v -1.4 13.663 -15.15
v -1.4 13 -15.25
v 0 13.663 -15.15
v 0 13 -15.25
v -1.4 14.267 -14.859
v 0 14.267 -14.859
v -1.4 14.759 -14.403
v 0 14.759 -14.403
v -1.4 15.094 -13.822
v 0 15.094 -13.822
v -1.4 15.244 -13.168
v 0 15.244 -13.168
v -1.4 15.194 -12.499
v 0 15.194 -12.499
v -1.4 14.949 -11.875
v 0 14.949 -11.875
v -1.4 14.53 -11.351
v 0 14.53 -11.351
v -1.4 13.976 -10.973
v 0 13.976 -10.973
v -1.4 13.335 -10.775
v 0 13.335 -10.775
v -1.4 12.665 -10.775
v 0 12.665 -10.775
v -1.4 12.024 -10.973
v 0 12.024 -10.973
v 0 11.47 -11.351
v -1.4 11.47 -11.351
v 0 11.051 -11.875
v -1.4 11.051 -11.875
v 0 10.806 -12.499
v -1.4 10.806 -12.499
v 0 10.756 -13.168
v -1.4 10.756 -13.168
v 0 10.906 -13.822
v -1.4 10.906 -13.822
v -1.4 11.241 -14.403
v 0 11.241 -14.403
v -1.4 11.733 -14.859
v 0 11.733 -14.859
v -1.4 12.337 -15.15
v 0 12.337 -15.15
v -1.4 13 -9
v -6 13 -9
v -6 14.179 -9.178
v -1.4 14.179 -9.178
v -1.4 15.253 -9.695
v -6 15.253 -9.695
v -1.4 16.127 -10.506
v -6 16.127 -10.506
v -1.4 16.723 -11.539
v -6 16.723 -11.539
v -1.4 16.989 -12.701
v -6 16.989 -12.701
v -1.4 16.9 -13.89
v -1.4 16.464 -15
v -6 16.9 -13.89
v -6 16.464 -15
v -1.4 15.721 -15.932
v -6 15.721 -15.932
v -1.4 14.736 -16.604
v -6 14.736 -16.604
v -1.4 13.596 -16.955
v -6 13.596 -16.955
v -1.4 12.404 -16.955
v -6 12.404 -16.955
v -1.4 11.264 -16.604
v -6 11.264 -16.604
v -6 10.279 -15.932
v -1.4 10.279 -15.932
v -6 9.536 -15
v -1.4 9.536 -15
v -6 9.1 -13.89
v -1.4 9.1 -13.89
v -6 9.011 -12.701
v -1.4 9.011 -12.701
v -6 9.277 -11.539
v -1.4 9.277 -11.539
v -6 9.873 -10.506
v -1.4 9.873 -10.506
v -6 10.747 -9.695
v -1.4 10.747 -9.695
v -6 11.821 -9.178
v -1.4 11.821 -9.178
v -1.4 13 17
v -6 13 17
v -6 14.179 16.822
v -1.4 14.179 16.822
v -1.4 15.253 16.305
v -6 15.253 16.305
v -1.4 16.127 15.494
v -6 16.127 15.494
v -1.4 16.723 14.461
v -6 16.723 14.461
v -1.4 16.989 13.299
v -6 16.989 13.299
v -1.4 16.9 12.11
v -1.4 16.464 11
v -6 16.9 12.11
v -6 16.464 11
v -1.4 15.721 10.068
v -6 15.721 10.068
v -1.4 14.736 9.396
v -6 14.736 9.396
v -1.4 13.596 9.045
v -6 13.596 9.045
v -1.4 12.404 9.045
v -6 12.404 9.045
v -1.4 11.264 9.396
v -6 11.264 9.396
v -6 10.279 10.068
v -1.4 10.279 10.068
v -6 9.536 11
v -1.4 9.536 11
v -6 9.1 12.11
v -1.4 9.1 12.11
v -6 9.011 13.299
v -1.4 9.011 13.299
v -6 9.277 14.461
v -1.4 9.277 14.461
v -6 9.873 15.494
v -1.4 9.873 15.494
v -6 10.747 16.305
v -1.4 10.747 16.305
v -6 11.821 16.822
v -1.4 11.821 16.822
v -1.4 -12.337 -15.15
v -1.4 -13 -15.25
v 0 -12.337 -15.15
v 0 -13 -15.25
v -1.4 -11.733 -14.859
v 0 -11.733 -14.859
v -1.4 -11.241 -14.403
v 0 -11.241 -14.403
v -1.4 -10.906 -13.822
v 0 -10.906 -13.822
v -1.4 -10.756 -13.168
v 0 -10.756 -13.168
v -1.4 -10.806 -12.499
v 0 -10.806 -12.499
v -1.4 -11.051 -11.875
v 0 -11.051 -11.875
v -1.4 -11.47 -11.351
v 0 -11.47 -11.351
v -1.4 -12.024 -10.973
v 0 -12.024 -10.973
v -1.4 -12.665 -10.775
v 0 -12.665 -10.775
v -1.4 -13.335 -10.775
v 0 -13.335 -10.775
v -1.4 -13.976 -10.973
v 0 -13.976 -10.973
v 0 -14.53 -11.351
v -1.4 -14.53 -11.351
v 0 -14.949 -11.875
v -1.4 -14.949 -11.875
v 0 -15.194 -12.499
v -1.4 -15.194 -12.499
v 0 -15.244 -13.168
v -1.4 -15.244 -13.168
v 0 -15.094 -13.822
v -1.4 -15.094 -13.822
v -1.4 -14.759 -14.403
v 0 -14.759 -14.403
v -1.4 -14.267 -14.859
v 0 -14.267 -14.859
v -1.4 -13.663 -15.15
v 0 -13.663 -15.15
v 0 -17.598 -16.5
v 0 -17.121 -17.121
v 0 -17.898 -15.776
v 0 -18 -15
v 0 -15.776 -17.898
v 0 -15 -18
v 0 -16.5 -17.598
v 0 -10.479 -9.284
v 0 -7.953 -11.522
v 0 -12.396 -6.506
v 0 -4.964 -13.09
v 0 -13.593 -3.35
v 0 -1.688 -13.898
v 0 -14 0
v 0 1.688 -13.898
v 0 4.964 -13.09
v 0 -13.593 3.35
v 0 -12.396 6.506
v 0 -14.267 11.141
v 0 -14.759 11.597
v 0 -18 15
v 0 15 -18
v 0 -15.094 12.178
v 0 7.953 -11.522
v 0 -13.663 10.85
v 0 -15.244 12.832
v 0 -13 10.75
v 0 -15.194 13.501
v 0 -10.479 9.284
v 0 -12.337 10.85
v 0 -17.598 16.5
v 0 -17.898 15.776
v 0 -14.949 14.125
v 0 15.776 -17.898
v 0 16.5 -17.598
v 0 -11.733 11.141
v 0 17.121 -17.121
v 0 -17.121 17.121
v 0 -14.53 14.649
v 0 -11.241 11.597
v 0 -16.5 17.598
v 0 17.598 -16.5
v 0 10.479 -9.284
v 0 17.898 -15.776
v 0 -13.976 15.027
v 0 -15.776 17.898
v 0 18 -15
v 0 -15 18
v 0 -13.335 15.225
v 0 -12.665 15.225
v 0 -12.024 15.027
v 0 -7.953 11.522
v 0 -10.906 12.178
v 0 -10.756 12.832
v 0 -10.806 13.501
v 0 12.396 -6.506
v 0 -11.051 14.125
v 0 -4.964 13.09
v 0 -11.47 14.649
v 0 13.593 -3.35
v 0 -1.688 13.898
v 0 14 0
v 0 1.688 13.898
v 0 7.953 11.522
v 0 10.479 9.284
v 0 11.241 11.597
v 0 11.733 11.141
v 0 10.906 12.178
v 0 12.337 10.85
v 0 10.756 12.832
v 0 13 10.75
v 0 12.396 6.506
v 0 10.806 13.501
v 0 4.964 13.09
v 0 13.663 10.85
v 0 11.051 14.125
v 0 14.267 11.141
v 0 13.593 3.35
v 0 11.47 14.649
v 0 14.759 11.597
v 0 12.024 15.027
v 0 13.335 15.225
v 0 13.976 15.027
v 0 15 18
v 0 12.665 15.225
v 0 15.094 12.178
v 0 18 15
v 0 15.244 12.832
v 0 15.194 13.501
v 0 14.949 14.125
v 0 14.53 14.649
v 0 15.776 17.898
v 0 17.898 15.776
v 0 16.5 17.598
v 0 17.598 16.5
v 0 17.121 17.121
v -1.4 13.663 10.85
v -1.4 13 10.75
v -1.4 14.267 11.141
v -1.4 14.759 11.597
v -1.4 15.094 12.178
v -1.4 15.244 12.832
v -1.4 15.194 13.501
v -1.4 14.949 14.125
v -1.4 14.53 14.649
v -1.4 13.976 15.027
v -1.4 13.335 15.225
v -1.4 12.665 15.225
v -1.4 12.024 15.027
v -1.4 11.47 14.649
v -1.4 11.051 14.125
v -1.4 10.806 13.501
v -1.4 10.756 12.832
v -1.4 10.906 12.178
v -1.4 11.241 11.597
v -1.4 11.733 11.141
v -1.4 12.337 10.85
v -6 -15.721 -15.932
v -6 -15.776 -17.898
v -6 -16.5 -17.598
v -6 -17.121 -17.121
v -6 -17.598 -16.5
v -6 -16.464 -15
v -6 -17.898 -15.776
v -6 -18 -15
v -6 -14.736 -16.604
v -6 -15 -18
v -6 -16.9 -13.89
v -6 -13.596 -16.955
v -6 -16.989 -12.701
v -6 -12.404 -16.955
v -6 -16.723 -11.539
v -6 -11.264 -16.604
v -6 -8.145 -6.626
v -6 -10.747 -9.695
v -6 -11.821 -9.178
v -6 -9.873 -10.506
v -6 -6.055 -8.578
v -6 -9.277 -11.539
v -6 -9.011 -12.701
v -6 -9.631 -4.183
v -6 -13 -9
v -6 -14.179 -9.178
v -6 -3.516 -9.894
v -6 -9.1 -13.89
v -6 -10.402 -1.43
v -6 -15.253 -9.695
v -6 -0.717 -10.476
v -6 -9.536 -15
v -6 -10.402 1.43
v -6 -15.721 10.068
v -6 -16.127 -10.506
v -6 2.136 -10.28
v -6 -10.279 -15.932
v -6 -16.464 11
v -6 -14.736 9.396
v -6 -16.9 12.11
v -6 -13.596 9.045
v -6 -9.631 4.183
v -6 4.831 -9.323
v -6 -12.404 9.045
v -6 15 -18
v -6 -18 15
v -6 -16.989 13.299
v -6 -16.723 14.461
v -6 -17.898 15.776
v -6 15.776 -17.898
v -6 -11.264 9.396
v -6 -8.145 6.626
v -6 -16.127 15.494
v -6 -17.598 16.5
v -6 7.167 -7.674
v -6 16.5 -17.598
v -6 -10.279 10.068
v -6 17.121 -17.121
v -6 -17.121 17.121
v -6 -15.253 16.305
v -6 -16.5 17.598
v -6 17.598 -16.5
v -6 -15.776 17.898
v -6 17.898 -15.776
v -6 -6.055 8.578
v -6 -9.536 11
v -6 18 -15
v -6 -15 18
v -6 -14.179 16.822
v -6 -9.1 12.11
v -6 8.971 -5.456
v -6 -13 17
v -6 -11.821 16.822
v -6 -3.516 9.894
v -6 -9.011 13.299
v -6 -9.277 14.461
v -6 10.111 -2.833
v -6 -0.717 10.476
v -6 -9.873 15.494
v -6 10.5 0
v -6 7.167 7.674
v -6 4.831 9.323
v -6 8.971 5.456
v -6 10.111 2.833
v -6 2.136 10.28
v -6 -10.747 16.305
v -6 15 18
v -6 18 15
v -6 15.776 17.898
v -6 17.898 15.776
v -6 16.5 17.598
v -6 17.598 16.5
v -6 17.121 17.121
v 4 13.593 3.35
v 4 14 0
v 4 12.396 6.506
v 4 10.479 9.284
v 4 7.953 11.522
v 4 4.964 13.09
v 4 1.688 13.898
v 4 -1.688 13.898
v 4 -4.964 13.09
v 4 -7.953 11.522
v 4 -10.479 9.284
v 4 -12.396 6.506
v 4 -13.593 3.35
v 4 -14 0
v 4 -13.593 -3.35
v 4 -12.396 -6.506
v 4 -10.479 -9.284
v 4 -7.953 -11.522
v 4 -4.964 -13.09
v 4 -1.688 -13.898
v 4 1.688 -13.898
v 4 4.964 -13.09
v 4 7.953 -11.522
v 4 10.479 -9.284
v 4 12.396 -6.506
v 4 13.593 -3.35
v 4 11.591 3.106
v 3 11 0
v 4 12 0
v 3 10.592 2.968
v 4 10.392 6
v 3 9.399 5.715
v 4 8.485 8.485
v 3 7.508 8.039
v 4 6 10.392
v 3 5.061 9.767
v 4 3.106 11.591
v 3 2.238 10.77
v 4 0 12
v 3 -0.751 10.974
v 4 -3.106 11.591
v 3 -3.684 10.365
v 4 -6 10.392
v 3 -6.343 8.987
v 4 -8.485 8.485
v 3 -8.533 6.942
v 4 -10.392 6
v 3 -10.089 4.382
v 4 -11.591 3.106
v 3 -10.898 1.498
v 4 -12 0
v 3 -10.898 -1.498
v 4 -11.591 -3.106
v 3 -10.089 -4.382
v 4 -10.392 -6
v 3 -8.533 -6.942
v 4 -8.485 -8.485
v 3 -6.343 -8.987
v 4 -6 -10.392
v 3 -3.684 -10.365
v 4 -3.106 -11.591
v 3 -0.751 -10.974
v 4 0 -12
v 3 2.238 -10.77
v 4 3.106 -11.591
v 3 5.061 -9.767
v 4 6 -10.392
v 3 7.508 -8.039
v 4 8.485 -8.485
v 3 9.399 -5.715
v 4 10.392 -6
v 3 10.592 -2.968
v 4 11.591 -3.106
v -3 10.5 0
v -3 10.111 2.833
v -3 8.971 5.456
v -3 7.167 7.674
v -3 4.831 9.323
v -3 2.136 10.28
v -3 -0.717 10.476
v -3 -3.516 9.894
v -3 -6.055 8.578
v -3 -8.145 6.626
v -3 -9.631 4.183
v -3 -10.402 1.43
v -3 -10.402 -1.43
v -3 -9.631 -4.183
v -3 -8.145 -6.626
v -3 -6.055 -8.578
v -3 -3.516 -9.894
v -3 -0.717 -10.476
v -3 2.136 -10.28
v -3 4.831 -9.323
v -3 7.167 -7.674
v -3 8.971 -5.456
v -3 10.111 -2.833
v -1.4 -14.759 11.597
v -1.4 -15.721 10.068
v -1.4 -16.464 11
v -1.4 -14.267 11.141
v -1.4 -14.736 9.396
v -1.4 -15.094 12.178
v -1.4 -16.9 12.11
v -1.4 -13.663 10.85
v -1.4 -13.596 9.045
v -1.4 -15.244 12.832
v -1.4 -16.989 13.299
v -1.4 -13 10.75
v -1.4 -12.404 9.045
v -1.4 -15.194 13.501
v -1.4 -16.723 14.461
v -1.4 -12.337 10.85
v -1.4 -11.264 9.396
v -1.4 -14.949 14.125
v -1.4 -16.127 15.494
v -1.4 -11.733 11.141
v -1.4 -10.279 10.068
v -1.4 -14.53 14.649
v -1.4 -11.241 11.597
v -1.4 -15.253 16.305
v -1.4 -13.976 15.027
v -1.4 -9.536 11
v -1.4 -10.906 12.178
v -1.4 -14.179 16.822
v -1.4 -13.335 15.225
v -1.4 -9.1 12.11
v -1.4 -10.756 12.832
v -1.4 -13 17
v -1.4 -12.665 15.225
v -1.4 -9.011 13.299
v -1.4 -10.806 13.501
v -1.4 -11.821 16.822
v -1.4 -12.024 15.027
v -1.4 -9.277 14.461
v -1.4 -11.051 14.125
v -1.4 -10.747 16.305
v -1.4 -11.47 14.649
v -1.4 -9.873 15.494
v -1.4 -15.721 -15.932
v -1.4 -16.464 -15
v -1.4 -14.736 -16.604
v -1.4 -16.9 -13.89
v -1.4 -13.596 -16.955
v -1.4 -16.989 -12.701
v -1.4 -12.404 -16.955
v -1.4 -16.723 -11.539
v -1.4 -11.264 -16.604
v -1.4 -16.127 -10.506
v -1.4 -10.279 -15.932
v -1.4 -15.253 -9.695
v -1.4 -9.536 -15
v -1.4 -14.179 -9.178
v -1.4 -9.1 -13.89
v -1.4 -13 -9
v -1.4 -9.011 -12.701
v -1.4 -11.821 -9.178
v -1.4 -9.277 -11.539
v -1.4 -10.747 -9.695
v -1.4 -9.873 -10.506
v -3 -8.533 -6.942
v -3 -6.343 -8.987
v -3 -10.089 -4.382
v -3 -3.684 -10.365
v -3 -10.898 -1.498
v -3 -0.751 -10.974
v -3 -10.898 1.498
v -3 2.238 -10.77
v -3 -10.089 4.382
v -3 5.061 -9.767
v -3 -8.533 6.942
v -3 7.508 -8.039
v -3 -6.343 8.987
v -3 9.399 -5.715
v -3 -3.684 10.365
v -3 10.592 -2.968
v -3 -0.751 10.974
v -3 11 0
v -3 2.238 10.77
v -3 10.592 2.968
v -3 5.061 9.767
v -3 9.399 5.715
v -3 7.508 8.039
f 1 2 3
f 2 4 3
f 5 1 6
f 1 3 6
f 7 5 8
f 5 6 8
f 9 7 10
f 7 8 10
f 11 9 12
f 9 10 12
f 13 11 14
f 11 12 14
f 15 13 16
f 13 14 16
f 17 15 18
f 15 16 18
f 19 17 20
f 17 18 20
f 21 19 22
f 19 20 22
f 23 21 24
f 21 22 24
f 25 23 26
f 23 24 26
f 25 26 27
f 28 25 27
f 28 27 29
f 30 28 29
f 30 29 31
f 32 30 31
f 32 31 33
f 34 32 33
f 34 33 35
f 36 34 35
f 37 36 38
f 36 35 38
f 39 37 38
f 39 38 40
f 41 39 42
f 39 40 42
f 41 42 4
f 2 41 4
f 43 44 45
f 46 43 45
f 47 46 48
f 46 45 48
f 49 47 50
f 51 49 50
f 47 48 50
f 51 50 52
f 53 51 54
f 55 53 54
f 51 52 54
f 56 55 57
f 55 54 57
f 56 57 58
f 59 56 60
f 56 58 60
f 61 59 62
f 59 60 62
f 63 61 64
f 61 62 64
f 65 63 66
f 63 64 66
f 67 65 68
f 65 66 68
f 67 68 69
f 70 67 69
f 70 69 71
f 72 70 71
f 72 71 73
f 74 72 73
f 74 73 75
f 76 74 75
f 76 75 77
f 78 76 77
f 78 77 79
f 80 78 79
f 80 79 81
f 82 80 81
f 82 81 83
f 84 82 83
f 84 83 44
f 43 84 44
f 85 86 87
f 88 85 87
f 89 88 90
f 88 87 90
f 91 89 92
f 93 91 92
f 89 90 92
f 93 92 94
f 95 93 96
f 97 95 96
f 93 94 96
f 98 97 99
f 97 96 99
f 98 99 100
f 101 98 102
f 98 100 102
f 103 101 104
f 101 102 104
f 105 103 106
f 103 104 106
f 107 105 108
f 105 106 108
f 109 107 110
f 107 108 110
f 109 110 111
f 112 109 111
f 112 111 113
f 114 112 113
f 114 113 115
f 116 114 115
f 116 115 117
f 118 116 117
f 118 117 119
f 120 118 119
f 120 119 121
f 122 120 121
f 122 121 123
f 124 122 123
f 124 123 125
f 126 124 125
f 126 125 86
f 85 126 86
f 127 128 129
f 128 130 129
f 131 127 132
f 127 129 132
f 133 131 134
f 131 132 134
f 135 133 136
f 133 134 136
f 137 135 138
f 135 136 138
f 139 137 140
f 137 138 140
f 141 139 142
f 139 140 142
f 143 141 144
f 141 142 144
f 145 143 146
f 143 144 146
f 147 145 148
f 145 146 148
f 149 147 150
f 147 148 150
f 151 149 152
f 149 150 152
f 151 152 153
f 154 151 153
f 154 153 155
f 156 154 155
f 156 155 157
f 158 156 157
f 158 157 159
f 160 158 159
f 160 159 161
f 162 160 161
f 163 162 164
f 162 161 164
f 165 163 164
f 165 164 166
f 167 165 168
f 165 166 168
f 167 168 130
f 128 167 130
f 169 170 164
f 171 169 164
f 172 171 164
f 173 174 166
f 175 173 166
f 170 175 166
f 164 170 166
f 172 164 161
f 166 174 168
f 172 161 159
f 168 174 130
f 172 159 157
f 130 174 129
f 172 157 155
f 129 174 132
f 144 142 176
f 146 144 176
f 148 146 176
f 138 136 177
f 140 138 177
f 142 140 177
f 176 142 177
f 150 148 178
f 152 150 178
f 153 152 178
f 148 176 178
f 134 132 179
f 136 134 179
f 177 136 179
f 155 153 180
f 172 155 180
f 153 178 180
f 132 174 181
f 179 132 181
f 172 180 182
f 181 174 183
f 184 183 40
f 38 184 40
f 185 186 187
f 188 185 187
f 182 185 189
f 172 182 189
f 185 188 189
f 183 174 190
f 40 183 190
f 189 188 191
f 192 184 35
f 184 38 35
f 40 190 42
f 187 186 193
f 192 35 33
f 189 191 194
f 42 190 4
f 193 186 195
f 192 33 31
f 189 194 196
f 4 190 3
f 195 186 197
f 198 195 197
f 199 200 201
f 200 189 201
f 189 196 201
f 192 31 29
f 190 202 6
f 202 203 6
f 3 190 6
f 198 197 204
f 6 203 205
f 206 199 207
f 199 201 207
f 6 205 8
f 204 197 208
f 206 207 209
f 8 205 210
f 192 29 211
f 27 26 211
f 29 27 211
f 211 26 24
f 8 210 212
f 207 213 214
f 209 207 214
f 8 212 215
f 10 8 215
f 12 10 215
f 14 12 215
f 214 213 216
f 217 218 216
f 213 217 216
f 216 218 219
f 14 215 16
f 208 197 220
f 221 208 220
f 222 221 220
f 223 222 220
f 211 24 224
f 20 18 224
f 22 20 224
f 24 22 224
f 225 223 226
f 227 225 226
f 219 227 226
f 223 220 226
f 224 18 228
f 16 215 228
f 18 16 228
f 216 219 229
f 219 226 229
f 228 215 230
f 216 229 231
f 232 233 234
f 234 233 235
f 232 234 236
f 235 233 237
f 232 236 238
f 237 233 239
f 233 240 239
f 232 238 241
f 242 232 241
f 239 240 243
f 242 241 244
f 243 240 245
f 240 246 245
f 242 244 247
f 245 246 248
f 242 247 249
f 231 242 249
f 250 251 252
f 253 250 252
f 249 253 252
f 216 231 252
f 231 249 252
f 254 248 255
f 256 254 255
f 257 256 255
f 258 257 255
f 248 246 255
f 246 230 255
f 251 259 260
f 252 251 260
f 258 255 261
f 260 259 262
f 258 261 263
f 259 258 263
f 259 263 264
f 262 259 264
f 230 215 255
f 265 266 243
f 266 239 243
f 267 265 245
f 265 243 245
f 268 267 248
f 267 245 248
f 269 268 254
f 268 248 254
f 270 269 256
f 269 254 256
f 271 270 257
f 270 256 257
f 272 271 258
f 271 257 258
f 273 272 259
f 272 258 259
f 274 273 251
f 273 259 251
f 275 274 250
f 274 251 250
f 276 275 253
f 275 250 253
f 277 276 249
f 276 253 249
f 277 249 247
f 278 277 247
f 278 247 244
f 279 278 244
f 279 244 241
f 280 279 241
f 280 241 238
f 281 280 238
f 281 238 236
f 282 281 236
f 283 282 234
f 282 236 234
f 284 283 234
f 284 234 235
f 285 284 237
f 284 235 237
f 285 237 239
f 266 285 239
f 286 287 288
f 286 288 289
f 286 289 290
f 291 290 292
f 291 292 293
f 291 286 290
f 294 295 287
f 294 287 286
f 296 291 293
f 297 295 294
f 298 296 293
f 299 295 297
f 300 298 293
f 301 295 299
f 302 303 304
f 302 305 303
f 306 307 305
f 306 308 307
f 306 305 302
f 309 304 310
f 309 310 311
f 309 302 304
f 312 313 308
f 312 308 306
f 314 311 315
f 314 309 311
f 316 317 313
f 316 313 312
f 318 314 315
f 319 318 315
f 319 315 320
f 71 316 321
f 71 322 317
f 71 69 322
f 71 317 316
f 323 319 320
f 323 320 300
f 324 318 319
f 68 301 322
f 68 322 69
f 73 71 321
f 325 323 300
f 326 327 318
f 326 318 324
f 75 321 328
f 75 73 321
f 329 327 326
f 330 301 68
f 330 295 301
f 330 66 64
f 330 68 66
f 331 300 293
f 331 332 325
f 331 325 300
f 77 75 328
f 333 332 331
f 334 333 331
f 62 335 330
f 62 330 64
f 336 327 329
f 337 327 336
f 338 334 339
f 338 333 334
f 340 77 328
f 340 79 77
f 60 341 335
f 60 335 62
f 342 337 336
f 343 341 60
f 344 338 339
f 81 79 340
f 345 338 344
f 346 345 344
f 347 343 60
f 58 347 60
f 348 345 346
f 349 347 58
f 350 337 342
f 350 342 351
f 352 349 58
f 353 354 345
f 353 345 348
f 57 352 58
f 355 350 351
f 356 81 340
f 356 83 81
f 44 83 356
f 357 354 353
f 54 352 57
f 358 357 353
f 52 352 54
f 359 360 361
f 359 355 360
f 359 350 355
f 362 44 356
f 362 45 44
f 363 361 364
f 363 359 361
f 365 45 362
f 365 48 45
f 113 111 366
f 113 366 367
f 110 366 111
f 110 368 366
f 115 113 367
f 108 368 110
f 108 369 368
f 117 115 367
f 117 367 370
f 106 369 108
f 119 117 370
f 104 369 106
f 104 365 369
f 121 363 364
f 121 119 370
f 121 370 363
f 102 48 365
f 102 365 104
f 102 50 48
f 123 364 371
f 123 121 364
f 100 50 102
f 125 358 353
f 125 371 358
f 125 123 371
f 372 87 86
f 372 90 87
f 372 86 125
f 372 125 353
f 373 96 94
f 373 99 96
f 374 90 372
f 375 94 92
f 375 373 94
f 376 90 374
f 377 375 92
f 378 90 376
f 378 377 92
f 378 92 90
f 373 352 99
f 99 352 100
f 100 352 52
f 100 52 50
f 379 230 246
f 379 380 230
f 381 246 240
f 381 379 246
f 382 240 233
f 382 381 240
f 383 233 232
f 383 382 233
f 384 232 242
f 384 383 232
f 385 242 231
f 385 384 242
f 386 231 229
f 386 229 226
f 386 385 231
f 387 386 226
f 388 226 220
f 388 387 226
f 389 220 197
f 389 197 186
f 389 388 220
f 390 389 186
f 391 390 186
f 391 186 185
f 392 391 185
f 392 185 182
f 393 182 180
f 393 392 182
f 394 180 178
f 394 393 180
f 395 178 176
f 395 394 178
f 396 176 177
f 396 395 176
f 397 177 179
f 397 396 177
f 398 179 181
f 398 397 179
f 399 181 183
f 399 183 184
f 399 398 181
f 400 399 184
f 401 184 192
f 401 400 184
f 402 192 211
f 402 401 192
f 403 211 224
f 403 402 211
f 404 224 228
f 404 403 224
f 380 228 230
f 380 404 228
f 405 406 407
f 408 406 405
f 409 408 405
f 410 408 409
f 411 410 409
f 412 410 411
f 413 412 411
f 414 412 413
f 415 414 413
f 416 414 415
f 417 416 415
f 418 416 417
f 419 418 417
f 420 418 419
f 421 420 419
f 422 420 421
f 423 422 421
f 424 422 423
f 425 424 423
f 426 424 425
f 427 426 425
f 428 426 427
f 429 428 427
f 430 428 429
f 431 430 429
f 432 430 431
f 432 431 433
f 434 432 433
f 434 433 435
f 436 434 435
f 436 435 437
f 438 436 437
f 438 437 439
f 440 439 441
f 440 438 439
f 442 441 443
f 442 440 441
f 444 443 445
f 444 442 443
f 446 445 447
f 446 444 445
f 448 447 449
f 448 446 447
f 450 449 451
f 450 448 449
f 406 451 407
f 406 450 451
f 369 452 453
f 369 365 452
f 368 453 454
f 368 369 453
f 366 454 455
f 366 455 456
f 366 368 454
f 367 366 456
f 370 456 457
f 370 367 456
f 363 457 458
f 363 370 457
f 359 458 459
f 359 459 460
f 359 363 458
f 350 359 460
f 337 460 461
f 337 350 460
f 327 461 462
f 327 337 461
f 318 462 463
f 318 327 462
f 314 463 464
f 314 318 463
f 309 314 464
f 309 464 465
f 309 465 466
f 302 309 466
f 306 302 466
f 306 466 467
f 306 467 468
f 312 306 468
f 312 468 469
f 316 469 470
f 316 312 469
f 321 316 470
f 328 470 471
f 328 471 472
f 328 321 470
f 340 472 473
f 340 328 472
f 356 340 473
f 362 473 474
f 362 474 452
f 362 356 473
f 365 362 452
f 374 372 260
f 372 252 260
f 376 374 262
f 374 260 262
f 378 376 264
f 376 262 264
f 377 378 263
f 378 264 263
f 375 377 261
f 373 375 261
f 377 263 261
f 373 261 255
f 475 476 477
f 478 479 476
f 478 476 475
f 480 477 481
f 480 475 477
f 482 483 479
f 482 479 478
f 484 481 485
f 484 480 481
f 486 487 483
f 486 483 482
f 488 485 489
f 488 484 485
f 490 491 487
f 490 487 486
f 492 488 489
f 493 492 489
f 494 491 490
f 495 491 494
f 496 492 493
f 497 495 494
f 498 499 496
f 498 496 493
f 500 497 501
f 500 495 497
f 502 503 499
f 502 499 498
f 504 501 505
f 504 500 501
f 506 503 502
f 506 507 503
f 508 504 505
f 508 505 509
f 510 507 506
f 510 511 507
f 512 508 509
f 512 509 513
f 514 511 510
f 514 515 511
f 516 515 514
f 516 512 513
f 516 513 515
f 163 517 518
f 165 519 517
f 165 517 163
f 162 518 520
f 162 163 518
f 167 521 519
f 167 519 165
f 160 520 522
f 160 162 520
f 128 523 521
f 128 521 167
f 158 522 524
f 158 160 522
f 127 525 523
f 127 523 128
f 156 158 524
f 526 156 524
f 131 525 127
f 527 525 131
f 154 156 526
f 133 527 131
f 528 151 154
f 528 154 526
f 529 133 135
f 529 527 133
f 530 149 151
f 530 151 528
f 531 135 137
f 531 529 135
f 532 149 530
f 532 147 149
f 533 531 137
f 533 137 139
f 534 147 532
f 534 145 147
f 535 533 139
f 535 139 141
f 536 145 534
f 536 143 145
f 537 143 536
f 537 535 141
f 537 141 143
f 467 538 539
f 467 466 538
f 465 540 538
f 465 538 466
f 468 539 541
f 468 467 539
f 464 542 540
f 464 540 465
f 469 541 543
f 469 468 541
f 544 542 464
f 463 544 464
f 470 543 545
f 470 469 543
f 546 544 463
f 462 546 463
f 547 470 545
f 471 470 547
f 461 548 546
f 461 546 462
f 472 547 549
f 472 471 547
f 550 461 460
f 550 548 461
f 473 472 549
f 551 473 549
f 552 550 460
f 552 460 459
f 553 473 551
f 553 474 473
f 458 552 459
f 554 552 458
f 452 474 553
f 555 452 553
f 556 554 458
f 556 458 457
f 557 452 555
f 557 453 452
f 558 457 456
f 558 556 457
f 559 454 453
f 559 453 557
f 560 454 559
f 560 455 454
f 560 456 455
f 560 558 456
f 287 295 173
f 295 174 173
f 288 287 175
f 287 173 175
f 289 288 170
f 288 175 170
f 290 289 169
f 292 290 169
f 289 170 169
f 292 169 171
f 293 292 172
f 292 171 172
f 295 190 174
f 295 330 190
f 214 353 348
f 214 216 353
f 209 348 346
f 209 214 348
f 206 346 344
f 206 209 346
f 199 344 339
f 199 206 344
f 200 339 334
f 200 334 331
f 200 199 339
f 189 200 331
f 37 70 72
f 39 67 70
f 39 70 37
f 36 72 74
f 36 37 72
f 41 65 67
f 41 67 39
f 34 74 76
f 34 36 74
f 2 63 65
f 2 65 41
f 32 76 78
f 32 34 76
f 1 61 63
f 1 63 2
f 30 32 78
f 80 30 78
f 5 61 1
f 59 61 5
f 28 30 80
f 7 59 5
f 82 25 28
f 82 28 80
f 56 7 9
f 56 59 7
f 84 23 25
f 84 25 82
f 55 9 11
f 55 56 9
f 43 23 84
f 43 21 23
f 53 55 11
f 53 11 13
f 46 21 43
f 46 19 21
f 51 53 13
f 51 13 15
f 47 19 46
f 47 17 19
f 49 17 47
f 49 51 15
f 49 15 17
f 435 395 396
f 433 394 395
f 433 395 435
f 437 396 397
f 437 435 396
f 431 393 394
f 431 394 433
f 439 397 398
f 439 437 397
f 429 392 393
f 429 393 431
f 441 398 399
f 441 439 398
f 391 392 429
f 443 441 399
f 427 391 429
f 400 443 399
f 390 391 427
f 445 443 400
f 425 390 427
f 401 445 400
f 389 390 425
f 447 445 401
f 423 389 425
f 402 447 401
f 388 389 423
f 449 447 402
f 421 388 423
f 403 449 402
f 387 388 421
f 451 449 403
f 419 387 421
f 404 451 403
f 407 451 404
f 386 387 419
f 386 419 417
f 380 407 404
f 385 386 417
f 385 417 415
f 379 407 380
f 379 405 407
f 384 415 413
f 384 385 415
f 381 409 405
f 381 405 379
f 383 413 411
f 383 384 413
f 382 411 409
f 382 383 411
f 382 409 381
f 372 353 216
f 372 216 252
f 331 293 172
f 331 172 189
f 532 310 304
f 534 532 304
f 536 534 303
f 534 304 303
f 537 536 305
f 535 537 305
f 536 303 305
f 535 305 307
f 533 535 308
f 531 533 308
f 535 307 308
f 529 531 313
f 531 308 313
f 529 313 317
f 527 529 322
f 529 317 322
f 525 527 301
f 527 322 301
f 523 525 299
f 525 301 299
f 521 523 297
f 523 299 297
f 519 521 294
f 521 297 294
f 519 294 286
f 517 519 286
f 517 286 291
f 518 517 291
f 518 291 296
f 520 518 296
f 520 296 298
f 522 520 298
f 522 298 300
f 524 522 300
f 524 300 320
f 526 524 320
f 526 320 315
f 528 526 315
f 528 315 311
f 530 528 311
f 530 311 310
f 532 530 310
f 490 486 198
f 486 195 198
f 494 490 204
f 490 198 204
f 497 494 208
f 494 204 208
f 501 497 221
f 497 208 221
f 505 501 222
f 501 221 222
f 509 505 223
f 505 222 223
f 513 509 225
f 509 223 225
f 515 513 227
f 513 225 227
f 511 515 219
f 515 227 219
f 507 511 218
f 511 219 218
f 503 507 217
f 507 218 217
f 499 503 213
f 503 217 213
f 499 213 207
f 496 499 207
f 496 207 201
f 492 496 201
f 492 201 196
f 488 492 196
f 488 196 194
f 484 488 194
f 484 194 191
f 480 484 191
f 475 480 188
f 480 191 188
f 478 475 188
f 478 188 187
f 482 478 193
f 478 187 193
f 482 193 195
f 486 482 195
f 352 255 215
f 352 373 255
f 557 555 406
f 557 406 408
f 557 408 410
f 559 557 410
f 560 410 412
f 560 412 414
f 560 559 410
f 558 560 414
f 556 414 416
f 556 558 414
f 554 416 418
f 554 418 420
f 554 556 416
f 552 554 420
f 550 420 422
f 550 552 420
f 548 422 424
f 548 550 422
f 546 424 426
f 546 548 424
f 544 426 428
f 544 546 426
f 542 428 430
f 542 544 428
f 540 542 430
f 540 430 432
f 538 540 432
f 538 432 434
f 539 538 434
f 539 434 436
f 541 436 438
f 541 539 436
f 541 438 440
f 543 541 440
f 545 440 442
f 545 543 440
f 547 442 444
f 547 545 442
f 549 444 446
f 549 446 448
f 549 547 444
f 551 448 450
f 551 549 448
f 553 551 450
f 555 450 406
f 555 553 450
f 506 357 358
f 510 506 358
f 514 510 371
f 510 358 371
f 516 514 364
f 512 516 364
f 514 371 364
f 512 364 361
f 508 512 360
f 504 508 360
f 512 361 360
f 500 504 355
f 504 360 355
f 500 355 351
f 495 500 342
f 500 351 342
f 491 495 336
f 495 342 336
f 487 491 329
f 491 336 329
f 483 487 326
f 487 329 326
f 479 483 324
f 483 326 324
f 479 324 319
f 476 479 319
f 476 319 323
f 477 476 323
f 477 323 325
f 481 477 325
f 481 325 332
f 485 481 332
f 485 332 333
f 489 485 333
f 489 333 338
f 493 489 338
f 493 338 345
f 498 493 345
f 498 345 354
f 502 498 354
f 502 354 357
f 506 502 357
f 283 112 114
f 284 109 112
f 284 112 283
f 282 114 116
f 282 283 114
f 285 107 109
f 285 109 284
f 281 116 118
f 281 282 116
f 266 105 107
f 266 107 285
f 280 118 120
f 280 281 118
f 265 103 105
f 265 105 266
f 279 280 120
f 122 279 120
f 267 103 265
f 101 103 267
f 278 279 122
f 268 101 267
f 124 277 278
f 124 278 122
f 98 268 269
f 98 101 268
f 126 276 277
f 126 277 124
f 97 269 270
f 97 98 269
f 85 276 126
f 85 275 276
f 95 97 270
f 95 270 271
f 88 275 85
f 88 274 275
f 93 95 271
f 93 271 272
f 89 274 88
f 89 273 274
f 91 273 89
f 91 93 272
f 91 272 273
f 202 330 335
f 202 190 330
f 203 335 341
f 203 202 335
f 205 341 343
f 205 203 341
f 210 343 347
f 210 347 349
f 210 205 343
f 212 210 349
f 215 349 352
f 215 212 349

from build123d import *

# Parameters (mm, degrees)
EXTRUDE_1_DEPTH           = 6
FILLET_1_R                = 3
HOLE_WIZARD_2_D           = 4.5
HOLE_WIZARD_2_CBORE_D     = 8
HOLE_WIZARD_2_CBORE_DEPTH = 4.6
CHAMFER_1_SIZE            = 1


with BuildPart() as part:
    # 草图1 → 旋转1 (revolve)
    with BuildSketch(Plane.XY):
        Polygon((-6, 10.5), (-6, 18), (0, 18), (0, 14), (4, 14), (4, 11), (-3, 11), (-3, 10.5), align=None)
    revolve(axis=Axis((-10.541189269, 0, 0), (1, 0, 0)))

    # 草图5 → 凸台-拉伸1 (add)
    with BuildSketch(Plane.ZY.offset(6)):
        with BuildLine():
            ThreePointArc((-2.6e-08, 18), (12.727922052, 12.72792207), (18, 0))
            Line((18, 0), (18, 18))
            Line((18, 18), (-2.6e-08, 18))
        make_face()
        with BuildLine():
            Line((-18, 18), (-18, 3.1e-08))
            ThreePointArc((-18, 3.1e-08), (-12.72792206, 12.727922063), (-2.6e-08, 18))
            Line((-2.6e-08, 18), (-18, 18))
        make_face()
        with BuildLine():
            Line((-18, 3.1e-08), (-18, -18))
            Line((-18, -18), (0, -18))
            ThreePointArc((0, -18), (-12.727922072, -12.727922051), (-18, 3.1e-08))
        make_face()
        with BuildLine():
            ThreePointArc((18, 0), (12.727922061, -12.727922061), (0, -18))
            Line((0, -18), (18, -18))
            Line((18, -18), (18, 0))
        make_face()
    extrude(amount=-EXTRUDE_1_DEPTH)

    # 圆角1
    fillet_1_edges = [part.edges().sort_by_distance(p)[0] for p in [
        (-3, 18, 18),
        (-3, 18, -18),
        (-3, -18, -18),
        (-3, -18, 18),
    ]]
    fillet(fillet_1_edges, radius=FILLET_1_R)

    # 打孔尺寸(%根据)内六角圆柱头螺钉的类型2 (through all)
    with Locations(Plane.ZY.offset(6)):
        with Locations((-13, 13), (13, 13), (13, -13), (-13, -13)):
            CounterBoreHole(HOLE_WIZARD_2_D / 2, HOLE_WIZARD_2_CBORE_D / 2, HOLE_WIZARD_2_CBORE_DEPTH)

    # 倒角1
    chamfer_1_edges = [part.edges().sort_by_distance(p)[0] for p in [
        (4, -11, 0),
    ]]
    chamfer(chamfer_1_edges, length=CHAMFER_1_SIZE)


solid = part.part
